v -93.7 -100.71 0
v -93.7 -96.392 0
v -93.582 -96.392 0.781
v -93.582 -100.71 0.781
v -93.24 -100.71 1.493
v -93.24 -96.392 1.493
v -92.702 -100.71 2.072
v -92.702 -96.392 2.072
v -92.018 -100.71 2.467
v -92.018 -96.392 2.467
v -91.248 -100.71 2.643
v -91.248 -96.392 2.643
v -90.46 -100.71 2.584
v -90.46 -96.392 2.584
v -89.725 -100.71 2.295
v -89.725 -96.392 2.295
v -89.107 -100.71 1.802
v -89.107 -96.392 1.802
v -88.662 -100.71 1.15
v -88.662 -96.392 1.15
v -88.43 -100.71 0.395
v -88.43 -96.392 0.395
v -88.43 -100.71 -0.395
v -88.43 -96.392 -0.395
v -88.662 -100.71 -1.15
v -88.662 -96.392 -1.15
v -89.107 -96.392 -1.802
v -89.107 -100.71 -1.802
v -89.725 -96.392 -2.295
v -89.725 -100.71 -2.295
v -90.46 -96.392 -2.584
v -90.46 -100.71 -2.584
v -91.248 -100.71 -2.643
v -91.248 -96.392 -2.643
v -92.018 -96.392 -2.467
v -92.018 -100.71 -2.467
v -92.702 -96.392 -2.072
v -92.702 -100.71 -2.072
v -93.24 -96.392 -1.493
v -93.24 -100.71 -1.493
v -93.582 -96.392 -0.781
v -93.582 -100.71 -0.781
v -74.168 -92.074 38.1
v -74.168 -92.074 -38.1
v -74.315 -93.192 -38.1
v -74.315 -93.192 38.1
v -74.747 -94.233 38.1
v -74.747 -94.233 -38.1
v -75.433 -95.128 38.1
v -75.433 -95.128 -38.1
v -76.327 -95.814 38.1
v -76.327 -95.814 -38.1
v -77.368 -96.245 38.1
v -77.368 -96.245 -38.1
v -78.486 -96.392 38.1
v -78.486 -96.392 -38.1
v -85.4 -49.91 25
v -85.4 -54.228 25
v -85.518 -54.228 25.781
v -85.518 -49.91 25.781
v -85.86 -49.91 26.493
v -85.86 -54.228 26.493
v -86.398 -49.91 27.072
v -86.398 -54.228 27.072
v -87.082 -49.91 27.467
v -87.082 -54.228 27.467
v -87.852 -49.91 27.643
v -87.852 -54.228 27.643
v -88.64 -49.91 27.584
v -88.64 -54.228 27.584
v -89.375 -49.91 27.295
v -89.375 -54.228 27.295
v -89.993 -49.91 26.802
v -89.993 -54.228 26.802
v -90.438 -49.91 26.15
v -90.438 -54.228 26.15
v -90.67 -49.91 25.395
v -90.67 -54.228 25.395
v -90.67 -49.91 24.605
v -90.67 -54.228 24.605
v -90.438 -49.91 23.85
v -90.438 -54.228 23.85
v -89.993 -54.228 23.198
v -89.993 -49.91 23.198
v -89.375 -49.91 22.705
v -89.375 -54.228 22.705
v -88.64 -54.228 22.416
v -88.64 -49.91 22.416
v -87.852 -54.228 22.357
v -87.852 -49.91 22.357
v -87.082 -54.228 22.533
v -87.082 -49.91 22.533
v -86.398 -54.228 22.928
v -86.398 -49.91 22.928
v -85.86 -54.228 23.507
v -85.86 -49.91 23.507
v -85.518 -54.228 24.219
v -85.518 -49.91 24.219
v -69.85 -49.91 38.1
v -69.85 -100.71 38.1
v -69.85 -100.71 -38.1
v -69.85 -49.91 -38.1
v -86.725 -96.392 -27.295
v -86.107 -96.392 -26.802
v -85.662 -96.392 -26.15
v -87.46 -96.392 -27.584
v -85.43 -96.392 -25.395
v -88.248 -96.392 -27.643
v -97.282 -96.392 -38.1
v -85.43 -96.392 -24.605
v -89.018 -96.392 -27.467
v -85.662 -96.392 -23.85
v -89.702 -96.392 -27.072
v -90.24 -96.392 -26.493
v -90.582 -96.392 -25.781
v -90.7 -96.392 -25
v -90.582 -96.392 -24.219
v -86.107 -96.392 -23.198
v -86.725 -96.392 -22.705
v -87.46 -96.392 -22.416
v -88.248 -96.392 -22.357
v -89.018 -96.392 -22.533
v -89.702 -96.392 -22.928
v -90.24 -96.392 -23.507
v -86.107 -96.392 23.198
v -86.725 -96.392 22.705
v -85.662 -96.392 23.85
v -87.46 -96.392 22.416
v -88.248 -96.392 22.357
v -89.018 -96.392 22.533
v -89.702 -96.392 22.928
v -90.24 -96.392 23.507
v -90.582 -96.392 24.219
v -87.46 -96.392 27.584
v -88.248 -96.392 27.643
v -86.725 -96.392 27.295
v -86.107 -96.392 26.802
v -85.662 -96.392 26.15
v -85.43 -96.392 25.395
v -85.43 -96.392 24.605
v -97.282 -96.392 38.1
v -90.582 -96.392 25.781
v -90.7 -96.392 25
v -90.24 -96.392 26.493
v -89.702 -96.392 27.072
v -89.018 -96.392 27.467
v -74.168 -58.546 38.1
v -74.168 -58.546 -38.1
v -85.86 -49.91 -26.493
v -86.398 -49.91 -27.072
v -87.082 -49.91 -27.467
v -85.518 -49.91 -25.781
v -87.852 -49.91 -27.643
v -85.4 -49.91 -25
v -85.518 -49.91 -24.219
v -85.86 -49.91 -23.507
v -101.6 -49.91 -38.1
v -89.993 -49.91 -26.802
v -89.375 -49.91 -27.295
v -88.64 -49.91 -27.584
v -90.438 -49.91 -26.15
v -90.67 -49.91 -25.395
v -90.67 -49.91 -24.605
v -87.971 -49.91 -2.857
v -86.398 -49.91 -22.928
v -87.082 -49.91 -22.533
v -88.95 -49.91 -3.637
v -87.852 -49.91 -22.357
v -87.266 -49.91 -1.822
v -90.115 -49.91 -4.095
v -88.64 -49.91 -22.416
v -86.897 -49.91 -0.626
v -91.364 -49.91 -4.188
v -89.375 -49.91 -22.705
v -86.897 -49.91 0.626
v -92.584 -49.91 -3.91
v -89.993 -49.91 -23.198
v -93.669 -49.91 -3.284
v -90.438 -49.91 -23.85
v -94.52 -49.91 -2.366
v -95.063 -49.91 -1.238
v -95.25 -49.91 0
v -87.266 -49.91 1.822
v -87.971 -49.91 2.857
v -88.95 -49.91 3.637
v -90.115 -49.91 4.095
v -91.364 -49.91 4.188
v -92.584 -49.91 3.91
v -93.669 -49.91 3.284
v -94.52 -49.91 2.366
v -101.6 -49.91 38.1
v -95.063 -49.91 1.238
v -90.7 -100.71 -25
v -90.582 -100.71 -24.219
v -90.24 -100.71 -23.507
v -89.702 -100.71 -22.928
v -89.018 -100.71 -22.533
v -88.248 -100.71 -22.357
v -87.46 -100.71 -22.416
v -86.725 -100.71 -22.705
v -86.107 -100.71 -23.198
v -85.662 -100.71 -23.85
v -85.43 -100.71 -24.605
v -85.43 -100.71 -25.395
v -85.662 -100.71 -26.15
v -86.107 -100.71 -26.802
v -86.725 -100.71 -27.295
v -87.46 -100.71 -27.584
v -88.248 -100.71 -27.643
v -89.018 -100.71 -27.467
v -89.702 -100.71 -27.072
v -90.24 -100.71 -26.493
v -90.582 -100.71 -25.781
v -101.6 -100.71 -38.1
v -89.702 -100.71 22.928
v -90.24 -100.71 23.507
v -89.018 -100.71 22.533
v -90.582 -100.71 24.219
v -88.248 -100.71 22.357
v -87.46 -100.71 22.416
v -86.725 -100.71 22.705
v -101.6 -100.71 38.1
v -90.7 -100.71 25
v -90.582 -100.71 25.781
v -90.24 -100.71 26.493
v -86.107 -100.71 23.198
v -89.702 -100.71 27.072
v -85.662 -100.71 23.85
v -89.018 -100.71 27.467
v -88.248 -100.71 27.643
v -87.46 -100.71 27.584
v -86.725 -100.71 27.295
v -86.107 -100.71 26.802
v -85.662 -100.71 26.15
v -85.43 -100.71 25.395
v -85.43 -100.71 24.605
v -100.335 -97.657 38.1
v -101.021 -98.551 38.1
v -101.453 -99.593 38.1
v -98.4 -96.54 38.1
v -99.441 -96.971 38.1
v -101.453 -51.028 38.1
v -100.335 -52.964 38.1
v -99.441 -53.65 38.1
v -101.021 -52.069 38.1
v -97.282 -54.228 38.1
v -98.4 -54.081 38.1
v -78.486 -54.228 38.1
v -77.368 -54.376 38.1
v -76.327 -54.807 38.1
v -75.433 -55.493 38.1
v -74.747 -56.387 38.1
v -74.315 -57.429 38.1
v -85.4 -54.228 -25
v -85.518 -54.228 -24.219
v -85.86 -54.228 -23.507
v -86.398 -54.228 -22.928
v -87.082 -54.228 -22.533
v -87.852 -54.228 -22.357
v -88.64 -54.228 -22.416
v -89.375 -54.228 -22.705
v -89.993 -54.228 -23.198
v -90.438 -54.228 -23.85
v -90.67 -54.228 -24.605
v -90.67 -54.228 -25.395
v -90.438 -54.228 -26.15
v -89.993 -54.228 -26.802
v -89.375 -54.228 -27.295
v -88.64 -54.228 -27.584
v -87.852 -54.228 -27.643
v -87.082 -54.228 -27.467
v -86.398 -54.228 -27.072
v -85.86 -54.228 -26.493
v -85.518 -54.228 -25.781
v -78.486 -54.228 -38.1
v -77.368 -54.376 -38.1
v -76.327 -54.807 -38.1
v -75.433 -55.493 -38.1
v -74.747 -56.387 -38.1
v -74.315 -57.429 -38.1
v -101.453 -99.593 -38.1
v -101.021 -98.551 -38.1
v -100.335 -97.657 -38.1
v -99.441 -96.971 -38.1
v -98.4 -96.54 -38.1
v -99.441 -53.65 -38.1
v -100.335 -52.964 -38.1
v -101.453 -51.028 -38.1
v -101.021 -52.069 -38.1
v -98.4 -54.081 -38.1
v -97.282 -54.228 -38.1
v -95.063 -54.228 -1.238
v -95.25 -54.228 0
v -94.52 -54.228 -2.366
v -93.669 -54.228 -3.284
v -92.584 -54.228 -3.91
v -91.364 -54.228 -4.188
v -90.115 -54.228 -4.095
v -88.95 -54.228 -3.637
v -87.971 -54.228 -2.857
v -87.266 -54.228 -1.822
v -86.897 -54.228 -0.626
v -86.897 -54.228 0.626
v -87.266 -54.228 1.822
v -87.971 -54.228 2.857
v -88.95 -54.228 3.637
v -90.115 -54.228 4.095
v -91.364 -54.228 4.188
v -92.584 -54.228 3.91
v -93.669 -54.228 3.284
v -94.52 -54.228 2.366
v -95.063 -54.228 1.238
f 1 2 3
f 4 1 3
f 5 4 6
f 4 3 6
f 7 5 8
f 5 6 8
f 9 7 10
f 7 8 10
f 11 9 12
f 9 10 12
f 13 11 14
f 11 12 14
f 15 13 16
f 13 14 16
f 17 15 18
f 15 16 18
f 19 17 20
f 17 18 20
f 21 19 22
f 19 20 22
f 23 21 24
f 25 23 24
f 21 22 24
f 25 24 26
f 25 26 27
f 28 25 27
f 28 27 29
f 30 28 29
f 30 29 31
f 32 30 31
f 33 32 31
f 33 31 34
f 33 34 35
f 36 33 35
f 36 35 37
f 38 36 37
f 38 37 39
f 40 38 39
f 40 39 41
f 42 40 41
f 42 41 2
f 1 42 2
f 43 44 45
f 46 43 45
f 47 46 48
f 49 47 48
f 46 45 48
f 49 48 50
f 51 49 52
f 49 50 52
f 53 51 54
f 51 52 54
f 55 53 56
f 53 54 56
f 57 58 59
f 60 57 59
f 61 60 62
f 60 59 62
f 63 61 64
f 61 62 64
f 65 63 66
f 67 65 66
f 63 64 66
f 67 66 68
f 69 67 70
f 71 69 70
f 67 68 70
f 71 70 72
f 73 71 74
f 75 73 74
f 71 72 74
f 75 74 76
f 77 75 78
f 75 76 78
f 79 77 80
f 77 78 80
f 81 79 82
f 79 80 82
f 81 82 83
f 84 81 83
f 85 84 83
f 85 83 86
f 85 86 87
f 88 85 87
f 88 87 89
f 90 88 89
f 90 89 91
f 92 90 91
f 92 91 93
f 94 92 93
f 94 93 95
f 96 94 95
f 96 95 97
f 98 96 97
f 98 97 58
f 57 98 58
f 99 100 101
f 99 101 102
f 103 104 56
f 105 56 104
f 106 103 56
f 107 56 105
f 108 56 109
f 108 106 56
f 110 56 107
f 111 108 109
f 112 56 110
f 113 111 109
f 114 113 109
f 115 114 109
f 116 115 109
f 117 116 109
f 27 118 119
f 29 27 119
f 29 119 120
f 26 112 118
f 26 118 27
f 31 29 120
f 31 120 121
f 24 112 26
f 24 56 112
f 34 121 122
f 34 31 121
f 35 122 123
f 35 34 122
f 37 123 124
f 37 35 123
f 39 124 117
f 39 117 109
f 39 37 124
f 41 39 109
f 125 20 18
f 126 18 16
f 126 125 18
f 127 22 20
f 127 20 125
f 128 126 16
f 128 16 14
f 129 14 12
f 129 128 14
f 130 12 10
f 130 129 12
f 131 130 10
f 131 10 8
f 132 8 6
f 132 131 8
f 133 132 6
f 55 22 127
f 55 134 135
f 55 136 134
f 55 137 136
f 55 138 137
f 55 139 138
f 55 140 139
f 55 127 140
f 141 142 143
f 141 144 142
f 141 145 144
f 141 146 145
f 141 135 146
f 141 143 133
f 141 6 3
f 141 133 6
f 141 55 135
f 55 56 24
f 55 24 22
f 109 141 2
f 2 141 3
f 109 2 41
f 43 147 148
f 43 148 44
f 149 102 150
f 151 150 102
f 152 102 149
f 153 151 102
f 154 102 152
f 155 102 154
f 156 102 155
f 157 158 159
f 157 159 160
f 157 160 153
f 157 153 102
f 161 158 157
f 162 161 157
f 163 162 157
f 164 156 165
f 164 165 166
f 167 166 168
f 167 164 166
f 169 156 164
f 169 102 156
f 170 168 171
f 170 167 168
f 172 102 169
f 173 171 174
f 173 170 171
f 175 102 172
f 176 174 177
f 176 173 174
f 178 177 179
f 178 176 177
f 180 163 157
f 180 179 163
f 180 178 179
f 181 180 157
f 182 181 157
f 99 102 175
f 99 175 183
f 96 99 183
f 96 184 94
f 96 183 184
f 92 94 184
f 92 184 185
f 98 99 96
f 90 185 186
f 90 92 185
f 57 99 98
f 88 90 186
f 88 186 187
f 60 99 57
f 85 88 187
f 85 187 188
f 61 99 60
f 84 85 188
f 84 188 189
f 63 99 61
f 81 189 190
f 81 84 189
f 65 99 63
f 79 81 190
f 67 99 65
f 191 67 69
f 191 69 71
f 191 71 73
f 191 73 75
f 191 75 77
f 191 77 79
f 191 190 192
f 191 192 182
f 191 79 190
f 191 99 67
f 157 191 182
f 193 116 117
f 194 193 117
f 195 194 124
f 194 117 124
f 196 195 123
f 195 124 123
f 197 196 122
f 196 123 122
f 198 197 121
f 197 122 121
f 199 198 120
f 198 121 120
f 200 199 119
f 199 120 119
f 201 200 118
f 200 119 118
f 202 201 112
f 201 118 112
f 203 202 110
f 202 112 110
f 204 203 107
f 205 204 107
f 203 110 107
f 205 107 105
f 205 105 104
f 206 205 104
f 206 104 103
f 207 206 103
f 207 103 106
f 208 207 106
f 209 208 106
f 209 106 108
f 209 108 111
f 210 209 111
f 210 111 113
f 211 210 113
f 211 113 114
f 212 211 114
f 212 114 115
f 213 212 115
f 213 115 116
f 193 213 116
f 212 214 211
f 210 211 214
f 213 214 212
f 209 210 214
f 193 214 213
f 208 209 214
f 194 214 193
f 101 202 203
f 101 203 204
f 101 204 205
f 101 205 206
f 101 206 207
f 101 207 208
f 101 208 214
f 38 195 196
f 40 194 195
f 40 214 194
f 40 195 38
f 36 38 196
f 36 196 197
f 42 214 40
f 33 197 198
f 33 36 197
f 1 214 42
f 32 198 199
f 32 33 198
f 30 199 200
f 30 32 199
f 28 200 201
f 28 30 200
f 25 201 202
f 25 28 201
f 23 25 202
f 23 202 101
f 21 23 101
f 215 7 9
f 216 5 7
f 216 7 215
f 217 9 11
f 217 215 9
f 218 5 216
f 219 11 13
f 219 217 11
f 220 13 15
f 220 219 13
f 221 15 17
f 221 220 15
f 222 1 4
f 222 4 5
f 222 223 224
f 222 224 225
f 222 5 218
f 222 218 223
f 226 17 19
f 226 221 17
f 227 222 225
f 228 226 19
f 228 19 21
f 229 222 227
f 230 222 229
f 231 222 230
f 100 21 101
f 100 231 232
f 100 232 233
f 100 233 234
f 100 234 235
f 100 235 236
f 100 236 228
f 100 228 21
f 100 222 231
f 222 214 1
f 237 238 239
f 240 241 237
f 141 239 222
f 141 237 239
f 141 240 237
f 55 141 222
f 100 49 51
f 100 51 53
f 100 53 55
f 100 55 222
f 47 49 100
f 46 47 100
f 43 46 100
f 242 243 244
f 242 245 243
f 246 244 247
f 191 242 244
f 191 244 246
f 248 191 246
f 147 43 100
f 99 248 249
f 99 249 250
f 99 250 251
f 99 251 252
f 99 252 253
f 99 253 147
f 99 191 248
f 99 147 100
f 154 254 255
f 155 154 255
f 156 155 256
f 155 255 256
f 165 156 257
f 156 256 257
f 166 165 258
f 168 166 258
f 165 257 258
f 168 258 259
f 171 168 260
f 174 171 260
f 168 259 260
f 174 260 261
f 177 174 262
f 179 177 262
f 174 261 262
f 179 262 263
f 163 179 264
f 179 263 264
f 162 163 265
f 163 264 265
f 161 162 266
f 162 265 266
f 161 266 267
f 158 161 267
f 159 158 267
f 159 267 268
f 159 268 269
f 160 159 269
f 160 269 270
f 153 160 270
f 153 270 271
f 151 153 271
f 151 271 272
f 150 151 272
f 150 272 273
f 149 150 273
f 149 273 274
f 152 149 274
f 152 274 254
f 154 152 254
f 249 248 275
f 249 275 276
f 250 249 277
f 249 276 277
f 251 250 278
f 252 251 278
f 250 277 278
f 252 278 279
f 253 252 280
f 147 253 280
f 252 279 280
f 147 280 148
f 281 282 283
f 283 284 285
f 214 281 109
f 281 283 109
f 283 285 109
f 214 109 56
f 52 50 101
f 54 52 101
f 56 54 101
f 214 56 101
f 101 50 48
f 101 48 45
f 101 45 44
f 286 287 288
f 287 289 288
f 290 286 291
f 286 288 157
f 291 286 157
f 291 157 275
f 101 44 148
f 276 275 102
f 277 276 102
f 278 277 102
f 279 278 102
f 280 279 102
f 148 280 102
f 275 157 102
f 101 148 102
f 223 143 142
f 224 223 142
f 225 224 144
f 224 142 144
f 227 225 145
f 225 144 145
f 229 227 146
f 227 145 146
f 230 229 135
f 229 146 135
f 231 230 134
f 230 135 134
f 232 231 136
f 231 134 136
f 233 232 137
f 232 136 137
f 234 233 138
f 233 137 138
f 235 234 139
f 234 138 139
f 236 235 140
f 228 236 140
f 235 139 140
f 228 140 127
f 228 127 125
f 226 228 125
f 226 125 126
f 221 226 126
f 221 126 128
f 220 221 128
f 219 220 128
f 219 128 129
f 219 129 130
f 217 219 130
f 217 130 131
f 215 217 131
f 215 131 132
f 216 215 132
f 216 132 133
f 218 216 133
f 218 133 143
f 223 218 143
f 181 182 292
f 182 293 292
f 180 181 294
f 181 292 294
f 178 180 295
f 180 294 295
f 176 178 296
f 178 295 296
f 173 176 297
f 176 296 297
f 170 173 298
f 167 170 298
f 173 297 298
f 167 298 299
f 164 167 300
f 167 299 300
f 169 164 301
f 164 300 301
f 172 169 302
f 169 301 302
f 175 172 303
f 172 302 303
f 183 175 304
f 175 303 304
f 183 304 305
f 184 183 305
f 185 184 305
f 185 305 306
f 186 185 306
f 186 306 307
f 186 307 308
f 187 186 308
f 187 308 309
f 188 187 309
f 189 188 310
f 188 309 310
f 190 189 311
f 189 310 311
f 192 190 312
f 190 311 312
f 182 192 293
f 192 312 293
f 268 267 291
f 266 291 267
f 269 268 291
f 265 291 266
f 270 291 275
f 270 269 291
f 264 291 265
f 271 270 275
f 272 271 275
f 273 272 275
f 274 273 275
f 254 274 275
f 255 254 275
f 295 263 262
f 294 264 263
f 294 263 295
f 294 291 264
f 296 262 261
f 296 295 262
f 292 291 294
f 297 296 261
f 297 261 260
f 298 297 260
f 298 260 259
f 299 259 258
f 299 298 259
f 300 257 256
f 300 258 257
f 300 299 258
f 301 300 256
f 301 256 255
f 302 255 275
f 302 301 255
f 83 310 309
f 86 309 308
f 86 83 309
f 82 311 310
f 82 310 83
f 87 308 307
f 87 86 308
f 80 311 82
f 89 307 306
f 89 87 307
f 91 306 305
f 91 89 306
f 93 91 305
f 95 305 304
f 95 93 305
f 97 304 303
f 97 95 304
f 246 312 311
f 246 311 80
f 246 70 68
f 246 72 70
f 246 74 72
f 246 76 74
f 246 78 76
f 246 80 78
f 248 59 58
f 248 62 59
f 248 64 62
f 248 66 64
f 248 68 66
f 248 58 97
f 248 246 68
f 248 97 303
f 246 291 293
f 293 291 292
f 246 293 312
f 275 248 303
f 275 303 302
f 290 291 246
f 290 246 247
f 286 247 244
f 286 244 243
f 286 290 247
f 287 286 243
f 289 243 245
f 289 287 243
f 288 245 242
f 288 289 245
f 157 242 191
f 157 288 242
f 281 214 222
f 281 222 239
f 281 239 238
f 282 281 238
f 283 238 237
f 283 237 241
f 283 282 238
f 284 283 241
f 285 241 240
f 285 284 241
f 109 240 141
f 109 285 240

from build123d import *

# Parameters (mm, degrees)
BOSS_EXTRUDE1_DEPTH      = 38.1
FILLET1_START            = -39
FILLET1_DEPTH            = 78
FILLET1_START_2          = -38.1
FILLET1_2_DEPTH          = 76.2
M8_CLEARANCE_HOLE1_D     = 8.4
M8_CLEARANCE_HOLE1_DEPTH = 10.668
M8_CLEARANCE_HOLE1_TIP   = 2.5236146
M5_CLEARANCE_HOLE8_D     = 5.3
M5_CLEARANCE_HOLE8_DEPTH = 4.318
M5_CLEARANCE_HOLE9_D     = 5.3
M5_CLEARANCE_HOLE9_DEPTH = 4.318


with BuildPart() as part:
    # Sketch1 → Boss-Extrude1 (new, symmetric)
    with BuildSketch(Plane.XY):
        Polygon((-101.6, -100.710476364), (-69.85, -100.710476364), (-69.85, -49.910476364), (-101.6, -49.910476364), (-101.6, -54.228476364), (-74.168, -54.228476364), (-74.168, -96.392476364), (-101.6, -96.392476364), align=None)
    extrude(amount=BOSS_EXTRUDE1_DEPTH, both=True)

    # Fillet1: read off the stored shape, not the designer's step
    # Fillet1 outline → Fillet1 (cut)
    with BuildSketch(Plane.XY.offset(FILLET1_START)):
        with BuildLine():
            Line((-101.6, -54.228476364), (-97.282, -54.228476364))
            ThreePointArc((-97.282, -54.228476364), (-100.335287081, -52.963763446), (-101.6, -49.910476364))
            Line((-101.6, -49.910476364), (-101.6, -54.228476364))
        make_face()
        with BuildLine():
            ThreePointArc((-101.6, -100.710476364), (-100.335287081, -97.657189283), (-97.282, -96.392476364))
            Line((-97.282, -96.392476364), (-101.6, -96.392476364))
            Line((-101.6, -96.392476364), (-101.6, -100.710476364))
        make_face()
    extrude(amount=FILLET1_DEPTH, mode=Mode.SUBTRACT)

    # Fillet1 2 outline → Fillet1 2 (add)
    with BuildSketch(Plane.XY.offset(FILLET1_START_2)):
        with BuildLine():
            Line((-74.168, -96.392476364), (-74.168, -92.074476364))
            ThreePointArc((-74.168, -92.074476364), (-75.432712919, -95.127763446), (-78.486, -96.392476364))
            Line((-78.486, -96.392476364), (-74.168, -96.392476364))
        make_face()
        with BuildLine():
            Line((-74.168, -54.228476364), (-78.486, -54.228476364))
            ThreePointArc((-78.486, -54.228476364), (-75.432712919, -55.493189283), (-74.168, -58.546476364))
            Line((-74.168, -58.546476364), (-74.168, -54.228476364))
        make_face()
    extrude(amount=FILLET1_2_DEPTH)

    # M8 Clearance Hole1
    with Locations(Plane(origin=(-6.8, -43.560476364, 0), x_dir=(1, 0, 0), z_dir=(0, 1, 0))):
        with Locations((84.25, 0), (-84.25, 0)):
            Hole(M8_CLEARANCE_HOLE1_D / 2, depth=M8_CLEARANCE_HOLE1_DEPTH)
            with Locations((0, 0, -(M8_CLEARANCE_HOLE1_DEPTH + M8_CLEARANCE_HOLE1_TIP / 2))):  # 118° drill point
                Cone(0, M8_CLEARANCE_HOLE1_D / 2, M8_CLEARANCE_HOLE1_TIP, mode=Mode.SUBTRACT)

    # M5 Clearance Hole8
    with Locations(Plane(origin=(-6.8, -49.910476364, 0), x_dir=(-1, 0, 0), z_dir=(0, 1, 0))):
        with Locations((81.25, 25), (81.25, -25), (-81.25, -25), (-81.25, 25)):
            Hole(M5_CLEARANCE_HOLE8_D / 2, depth=M5_CLEARANCE_HOLE8_DEPTH)

    # M5 Clearance Hole9
    with Locations(Plane(origin=(-6.8, -100.710476364, 0), x_dir=(1, 0, 0), z_dir=(0, -1, 0))):
        with Locations((-81.25, -25), (-81.25, 25), (83.05, 25), (83.05, -25), (-84.25, 0), (84.25, 0)):
            Hole(M5_CLEARANCE_HOLE9_D / 2, depth=M5_CLEARANCE_HOLE9_DEPTH)


solid = part.part
